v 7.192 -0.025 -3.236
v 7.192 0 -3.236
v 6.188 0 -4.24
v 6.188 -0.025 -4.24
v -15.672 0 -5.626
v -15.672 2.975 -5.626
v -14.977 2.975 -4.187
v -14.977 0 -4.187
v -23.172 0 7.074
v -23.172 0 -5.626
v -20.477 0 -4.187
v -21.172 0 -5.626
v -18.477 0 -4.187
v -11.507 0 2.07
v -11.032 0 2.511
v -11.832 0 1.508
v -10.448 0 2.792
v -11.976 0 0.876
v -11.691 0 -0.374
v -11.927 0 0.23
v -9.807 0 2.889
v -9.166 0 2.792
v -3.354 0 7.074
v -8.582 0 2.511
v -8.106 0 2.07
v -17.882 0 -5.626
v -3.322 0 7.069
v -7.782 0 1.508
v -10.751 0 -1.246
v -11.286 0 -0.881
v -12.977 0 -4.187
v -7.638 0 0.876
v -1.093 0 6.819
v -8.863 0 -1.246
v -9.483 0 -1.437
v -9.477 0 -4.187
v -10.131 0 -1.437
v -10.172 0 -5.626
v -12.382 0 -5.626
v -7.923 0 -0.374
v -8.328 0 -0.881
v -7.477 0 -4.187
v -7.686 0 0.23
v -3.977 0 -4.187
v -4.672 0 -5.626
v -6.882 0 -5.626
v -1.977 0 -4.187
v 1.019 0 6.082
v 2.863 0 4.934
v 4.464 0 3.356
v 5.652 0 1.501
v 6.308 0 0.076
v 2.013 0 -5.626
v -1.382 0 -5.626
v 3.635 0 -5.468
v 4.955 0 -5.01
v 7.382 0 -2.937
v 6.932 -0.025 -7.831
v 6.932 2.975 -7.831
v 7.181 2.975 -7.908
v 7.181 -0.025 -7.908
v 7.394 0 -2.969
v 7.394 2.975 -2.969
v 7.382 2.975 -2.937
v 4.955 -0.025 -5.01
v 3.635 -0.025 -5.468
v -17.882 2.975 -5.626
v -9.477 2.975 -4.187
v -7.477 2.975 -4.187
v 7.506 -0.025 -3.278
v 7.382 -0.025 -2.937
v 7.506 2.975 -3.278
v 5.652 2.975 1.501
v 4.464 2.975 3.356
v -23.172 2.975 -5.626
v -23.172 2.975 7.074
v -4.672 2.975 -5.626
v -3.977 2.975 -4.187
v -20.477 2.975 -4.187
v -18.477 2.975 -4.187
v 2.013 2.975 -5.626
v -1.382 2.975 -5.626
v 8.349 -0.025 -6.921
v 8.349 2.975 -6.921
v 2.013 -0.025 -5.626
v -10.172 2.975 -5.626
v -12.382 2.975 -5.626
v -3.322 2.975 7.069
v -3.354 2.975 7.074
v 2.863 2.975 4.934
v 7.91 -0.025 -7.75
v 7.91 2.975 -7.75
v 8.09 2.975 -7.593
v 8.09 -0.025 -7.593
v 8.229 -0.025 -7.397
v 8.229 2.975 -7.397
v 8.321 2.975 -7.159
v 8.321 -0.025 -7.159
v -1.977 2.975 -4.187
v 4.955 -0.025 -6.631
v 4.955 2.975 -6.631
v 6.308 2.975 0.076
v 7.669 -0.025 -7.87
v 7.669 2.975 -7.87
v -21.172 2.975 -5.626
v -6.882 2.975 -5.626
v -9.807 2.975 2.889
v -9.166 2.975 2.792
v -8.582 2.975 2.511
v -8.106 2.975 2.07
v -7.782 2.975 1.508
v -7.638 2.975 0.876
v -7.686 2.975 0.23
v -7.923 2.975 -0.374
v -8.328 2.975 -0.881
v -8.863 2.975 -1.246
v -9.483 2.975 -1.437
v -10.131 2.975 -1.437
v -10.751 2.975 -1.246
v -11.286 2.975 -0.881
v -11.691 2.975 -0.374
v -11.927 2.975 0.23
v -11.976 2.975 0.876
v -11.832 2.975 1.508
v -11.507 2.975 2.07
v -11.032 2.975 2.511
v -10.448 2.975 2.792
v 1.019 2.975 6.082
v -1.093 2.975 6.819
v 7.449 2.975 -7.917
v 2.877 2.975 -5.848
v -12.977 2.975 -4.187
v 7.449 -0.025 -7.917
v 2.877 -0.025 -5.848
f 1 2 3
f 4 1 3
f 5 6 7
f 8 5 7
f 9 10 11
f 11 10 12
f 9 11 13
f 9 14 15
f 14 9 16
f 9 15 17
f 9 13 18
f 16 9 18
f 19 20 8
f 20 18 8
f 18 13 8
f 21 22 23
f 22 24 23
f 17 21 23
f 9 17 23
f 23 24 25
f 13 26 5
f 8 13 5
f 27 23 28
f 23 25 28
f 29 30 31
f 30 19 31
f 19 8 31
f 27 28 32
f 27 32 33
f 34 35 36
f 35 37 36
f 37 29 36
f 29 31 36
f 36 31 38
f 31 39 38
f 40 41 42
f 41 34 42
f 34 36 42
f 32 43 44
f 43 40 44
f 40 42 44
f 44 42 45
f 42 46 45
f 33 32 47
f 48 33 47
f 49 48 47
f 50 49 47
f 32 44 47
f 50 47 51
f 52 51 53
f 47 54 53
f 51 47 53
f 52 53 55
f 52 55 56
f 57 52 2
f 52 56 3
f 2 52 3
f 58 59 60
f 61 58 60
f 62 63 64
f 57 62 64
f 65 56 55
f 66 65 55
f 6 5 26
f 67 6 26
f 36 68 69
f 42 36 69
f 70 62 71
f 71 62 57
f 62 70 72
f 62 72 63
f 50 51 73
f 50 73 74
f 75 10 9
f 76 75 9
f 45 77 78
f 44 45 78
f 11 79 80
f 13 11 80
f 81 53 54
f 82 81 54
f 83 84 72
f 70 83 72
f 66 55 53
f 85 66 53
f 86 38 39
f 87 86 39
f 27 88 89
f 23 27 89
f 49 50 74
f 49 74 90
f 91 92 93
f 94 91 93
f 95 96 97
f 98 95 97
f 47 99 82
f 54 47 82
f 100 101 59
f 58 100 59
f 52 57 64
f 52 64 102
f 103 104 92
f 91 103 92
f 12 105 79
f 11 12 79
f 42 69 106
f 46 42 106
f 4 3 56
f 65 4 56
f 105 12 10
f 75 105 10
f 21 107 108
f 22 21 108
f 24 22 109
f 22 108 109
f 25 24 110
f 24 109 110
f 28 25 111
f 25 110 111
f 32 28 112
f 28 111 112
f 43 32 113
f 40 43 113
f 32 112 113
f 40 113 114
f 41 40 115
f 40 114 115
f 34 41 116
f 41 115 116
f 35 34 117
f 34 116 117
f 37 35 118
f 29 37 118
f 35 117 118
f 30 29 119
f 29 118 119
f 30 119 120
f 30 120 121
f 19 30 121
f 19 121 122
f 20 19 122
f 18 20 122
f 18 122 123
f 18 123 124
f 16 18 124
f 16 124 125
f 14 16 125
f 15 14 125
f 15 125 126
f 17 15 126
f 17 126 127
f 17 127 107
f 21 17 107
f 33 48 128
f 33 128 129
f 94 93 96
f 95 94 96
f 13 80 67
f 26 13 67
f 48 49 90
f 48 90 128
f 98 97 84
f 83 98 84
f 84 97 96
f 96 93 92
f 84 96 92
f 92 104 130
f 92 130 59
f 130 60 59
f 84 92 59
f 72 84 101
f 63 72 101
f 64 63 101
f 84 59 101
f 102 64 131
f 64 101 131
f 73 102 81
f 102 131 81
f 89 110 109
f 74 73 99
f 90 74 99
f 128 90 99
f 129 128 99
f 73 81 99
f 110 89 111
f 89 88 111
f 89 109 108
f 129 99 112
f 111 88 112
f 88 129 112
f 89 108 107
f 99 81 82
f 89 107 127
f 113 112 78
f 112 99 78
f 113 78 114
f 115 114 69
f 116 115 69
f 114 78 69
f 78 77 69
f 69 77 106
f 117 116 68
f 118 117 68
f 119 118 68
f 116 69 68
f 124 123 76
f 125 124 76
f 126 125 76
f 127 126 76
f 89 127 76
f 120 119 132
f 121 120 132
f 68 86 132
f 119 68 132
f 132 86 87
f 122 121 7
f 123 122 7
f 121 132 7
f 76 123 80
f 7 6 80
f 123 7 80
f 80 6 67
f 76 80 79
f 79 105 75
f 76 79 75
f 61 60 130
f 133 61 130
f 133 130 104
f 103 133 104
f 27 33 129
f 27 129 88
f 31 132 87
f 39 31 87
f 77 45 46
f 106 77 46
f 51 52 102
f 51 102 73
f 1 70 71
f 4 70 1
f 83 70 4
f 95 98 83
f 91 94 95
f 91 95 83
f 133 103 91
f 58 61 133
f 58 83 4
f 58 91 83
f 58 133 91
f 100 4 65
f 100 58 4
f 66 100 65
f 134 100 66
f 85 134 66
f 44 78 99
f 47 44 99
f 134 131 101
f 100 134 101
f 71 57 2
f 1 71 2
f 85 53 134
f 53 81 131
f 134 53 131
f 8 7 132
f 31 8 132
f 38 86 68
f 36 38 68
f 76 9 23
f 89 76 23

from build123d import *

# Parameters (mm, degrees)
BOSS_EXTRUDE1_DEPTH = 2.975
SKETCH3_R           = 2.175
CUT_EXTRUDE1_DEPTH  = 10
BOSS_EXTRUDE2_DEPTH = 3
CUT_EXTRUDE4_DEPTH  = 3
CUT_EXTRUDE5_DEPTH  = 3
CUT_EXTRUDE6_DEPTH  = 3
CUT_EXTRUDE7_DEPTH  = 3


with BuildPart() as part:
    # Sketch1 → Boss-Extrude1 (new body)
    with BuildSketch(Plane(origin=(0, 0, 0), x_dir=(1, 0, 0), z_dir=(0, 1, 0))):
        with BuildLine():
            Line((-23.171929825, 5.625877193), (-23.171929825, -7.074122807))
            Line((-23.171929825, -7.074122807), (2.228070175, -7.074122807))
            ThreePointArc((2.228070175, -7.074122807), (8.578070175, -0.724122807), (2.228070175, 5.625877193))
            Line((2.228070175, 5.625877193), (-23.171929825, 5.625877193))
        make_face()
    extrude(amount=BOSS_EXTRUDE1_DEPTH)

    # Sketch3 → Cut-Extrude1 (cut)
    with BuildSketch(Plane(origin=(0, 2.975, 0), x_dir=(1, 0, 0), z_dir=(0, 1, 0))):
        Polygon((-17.882133224, 5.625877193), (-21.171929825, 5.625877193), (-20.476894991, 4.187255521), (-18.476894991, 4.187255521), align=None)
        Polygon((-12.382133224, 5.625877193), (-15.671929825, 5.625877193), (-14.976894991, 4.187255521), (-12.976894991, 4.187255521), align=None)
        Polygon((-6.882133224, 5.625877193), (-10.171929825, 5.625877193), (-9.476894991, 4.187255521), (-7.476894991, 4.187255521), align=None)
        Polygon((-1.382133224, 5.625877193), (-4.671929825, 5.625877193), (-3.976894991, 4.187255521), (-1.976894991, 4.187255521), align=None)
        with Locations(Location((-9.806894991, -0.713854538, 0), (0, 0, 270))):
            Circle(SKETCH3_R)
    extrude(amount=-CUT_EXTRUDE1_DEPTH, mode=Mode.SUBTRACT)

    # Sketch4 → Boss-Extrude2 (add)
    with BuildSketch(Plane(origin=(0, 2.975, 0), x_dir=(1, 0, 0), z_dir=(0, 1, 0))):
        Polygon((2.012508497, 5.625877193), (2.877447204, 5.848143738), (4.955403332, 6.631142622), (6.932313313, 7.831153974), (7.181023471, 7.907898717), (7.449388225, 7.917059752), (7.669017249, 7.869526346), (7.909998428, 7.749936115), (8.090301913, 7.593296768), (8.229089145, 7.396943716), (8.320584378, 7.15885929), (8.349013293, 6.921336926), (7.506024116, 3.278478183), (7.381859278, 2.936726049), (7.191829205, 3.236129243), (6.188322225, 4.239636223), (4.955403332, 5.010347862), (3.635222185, 5.468003098), align=None)
    extrude(amount=-BOSS_EXTRUDE2_DEPTH)

    # Sketch5 → Cut-Extrude4 (cut)
    with BuildSketch(Plane.XZ):
        Polygon((7.381859278, -2.936726049), (6.307567975, 0.076195893), (5.651690171, 1.50143626), (4.463765556, 3.356436211), (2.862913669, 4.934447261), (1.01921029, 6.082107474), (-1.092761509, 6.819455434), (-3.321732513, 7.068870042), (2.228070175, 7.074122807), (3.760260473, 6.886500018), (5.204465919, 6.333362361), (6.48158413, 5.439005525), (7.484091138, 4.287371835), (8.1884819, 2.914098165), (8.543501486, 1.385808052), (8.521355854, -0.122668414), (8.123713387, -1.634667375), (7.393611108, -2.969071864), align=None)
    extrude(amount=-CUT_EXTRUDE4_DEPTH, mode=Mode.SUBTRACT)

    # Sketch8 → Cut-Extrude5 (cut)
    with BuildSketch(Plane.XZ):
        Polygon((7.393611108, -2.969071864), (4.817266947, 7.178326075), (13.149056149, 1.259568719), align=None)
    extrude(amount=-CUT_EXTRUDE5_DEPTH, mode=Mode.SUBTRACT)

    # Sketch9 → Cut-Extrude6 (cut)
    with BuildSketch(Plane(origin=(0, 2.975, 0), x_dir=(1, 0, 0), z_dir=(0, 1, 0))):
        Polygon((-2.812690859, -7.210619116), (5.027177804, -8.631982179), (5.504181298, -6.000955074), align=None)
    extrude(amount=-CUT_EXTRUDE6_DEPTH, mode=Mode.SUBTRACT)

    # Sketch10 → Cut-Extrude7 (cut)
    with BuildSketch(Plane(origin=(0, 2.975, 0), x_dir=(1, 0, 0), z_dir=(0, 1, 0))):
        Polygon((-3.321732513, -7.068870042), (-3.353757598, -7.074122807), (-1.90048619, -7.144223144), (-1.755238834, -7.012343357), align=None)
    extrude(amount=-CUT_EXTRUDE7_DEPTH, mode=Mode.SUBTRACT)


solid = part.part
